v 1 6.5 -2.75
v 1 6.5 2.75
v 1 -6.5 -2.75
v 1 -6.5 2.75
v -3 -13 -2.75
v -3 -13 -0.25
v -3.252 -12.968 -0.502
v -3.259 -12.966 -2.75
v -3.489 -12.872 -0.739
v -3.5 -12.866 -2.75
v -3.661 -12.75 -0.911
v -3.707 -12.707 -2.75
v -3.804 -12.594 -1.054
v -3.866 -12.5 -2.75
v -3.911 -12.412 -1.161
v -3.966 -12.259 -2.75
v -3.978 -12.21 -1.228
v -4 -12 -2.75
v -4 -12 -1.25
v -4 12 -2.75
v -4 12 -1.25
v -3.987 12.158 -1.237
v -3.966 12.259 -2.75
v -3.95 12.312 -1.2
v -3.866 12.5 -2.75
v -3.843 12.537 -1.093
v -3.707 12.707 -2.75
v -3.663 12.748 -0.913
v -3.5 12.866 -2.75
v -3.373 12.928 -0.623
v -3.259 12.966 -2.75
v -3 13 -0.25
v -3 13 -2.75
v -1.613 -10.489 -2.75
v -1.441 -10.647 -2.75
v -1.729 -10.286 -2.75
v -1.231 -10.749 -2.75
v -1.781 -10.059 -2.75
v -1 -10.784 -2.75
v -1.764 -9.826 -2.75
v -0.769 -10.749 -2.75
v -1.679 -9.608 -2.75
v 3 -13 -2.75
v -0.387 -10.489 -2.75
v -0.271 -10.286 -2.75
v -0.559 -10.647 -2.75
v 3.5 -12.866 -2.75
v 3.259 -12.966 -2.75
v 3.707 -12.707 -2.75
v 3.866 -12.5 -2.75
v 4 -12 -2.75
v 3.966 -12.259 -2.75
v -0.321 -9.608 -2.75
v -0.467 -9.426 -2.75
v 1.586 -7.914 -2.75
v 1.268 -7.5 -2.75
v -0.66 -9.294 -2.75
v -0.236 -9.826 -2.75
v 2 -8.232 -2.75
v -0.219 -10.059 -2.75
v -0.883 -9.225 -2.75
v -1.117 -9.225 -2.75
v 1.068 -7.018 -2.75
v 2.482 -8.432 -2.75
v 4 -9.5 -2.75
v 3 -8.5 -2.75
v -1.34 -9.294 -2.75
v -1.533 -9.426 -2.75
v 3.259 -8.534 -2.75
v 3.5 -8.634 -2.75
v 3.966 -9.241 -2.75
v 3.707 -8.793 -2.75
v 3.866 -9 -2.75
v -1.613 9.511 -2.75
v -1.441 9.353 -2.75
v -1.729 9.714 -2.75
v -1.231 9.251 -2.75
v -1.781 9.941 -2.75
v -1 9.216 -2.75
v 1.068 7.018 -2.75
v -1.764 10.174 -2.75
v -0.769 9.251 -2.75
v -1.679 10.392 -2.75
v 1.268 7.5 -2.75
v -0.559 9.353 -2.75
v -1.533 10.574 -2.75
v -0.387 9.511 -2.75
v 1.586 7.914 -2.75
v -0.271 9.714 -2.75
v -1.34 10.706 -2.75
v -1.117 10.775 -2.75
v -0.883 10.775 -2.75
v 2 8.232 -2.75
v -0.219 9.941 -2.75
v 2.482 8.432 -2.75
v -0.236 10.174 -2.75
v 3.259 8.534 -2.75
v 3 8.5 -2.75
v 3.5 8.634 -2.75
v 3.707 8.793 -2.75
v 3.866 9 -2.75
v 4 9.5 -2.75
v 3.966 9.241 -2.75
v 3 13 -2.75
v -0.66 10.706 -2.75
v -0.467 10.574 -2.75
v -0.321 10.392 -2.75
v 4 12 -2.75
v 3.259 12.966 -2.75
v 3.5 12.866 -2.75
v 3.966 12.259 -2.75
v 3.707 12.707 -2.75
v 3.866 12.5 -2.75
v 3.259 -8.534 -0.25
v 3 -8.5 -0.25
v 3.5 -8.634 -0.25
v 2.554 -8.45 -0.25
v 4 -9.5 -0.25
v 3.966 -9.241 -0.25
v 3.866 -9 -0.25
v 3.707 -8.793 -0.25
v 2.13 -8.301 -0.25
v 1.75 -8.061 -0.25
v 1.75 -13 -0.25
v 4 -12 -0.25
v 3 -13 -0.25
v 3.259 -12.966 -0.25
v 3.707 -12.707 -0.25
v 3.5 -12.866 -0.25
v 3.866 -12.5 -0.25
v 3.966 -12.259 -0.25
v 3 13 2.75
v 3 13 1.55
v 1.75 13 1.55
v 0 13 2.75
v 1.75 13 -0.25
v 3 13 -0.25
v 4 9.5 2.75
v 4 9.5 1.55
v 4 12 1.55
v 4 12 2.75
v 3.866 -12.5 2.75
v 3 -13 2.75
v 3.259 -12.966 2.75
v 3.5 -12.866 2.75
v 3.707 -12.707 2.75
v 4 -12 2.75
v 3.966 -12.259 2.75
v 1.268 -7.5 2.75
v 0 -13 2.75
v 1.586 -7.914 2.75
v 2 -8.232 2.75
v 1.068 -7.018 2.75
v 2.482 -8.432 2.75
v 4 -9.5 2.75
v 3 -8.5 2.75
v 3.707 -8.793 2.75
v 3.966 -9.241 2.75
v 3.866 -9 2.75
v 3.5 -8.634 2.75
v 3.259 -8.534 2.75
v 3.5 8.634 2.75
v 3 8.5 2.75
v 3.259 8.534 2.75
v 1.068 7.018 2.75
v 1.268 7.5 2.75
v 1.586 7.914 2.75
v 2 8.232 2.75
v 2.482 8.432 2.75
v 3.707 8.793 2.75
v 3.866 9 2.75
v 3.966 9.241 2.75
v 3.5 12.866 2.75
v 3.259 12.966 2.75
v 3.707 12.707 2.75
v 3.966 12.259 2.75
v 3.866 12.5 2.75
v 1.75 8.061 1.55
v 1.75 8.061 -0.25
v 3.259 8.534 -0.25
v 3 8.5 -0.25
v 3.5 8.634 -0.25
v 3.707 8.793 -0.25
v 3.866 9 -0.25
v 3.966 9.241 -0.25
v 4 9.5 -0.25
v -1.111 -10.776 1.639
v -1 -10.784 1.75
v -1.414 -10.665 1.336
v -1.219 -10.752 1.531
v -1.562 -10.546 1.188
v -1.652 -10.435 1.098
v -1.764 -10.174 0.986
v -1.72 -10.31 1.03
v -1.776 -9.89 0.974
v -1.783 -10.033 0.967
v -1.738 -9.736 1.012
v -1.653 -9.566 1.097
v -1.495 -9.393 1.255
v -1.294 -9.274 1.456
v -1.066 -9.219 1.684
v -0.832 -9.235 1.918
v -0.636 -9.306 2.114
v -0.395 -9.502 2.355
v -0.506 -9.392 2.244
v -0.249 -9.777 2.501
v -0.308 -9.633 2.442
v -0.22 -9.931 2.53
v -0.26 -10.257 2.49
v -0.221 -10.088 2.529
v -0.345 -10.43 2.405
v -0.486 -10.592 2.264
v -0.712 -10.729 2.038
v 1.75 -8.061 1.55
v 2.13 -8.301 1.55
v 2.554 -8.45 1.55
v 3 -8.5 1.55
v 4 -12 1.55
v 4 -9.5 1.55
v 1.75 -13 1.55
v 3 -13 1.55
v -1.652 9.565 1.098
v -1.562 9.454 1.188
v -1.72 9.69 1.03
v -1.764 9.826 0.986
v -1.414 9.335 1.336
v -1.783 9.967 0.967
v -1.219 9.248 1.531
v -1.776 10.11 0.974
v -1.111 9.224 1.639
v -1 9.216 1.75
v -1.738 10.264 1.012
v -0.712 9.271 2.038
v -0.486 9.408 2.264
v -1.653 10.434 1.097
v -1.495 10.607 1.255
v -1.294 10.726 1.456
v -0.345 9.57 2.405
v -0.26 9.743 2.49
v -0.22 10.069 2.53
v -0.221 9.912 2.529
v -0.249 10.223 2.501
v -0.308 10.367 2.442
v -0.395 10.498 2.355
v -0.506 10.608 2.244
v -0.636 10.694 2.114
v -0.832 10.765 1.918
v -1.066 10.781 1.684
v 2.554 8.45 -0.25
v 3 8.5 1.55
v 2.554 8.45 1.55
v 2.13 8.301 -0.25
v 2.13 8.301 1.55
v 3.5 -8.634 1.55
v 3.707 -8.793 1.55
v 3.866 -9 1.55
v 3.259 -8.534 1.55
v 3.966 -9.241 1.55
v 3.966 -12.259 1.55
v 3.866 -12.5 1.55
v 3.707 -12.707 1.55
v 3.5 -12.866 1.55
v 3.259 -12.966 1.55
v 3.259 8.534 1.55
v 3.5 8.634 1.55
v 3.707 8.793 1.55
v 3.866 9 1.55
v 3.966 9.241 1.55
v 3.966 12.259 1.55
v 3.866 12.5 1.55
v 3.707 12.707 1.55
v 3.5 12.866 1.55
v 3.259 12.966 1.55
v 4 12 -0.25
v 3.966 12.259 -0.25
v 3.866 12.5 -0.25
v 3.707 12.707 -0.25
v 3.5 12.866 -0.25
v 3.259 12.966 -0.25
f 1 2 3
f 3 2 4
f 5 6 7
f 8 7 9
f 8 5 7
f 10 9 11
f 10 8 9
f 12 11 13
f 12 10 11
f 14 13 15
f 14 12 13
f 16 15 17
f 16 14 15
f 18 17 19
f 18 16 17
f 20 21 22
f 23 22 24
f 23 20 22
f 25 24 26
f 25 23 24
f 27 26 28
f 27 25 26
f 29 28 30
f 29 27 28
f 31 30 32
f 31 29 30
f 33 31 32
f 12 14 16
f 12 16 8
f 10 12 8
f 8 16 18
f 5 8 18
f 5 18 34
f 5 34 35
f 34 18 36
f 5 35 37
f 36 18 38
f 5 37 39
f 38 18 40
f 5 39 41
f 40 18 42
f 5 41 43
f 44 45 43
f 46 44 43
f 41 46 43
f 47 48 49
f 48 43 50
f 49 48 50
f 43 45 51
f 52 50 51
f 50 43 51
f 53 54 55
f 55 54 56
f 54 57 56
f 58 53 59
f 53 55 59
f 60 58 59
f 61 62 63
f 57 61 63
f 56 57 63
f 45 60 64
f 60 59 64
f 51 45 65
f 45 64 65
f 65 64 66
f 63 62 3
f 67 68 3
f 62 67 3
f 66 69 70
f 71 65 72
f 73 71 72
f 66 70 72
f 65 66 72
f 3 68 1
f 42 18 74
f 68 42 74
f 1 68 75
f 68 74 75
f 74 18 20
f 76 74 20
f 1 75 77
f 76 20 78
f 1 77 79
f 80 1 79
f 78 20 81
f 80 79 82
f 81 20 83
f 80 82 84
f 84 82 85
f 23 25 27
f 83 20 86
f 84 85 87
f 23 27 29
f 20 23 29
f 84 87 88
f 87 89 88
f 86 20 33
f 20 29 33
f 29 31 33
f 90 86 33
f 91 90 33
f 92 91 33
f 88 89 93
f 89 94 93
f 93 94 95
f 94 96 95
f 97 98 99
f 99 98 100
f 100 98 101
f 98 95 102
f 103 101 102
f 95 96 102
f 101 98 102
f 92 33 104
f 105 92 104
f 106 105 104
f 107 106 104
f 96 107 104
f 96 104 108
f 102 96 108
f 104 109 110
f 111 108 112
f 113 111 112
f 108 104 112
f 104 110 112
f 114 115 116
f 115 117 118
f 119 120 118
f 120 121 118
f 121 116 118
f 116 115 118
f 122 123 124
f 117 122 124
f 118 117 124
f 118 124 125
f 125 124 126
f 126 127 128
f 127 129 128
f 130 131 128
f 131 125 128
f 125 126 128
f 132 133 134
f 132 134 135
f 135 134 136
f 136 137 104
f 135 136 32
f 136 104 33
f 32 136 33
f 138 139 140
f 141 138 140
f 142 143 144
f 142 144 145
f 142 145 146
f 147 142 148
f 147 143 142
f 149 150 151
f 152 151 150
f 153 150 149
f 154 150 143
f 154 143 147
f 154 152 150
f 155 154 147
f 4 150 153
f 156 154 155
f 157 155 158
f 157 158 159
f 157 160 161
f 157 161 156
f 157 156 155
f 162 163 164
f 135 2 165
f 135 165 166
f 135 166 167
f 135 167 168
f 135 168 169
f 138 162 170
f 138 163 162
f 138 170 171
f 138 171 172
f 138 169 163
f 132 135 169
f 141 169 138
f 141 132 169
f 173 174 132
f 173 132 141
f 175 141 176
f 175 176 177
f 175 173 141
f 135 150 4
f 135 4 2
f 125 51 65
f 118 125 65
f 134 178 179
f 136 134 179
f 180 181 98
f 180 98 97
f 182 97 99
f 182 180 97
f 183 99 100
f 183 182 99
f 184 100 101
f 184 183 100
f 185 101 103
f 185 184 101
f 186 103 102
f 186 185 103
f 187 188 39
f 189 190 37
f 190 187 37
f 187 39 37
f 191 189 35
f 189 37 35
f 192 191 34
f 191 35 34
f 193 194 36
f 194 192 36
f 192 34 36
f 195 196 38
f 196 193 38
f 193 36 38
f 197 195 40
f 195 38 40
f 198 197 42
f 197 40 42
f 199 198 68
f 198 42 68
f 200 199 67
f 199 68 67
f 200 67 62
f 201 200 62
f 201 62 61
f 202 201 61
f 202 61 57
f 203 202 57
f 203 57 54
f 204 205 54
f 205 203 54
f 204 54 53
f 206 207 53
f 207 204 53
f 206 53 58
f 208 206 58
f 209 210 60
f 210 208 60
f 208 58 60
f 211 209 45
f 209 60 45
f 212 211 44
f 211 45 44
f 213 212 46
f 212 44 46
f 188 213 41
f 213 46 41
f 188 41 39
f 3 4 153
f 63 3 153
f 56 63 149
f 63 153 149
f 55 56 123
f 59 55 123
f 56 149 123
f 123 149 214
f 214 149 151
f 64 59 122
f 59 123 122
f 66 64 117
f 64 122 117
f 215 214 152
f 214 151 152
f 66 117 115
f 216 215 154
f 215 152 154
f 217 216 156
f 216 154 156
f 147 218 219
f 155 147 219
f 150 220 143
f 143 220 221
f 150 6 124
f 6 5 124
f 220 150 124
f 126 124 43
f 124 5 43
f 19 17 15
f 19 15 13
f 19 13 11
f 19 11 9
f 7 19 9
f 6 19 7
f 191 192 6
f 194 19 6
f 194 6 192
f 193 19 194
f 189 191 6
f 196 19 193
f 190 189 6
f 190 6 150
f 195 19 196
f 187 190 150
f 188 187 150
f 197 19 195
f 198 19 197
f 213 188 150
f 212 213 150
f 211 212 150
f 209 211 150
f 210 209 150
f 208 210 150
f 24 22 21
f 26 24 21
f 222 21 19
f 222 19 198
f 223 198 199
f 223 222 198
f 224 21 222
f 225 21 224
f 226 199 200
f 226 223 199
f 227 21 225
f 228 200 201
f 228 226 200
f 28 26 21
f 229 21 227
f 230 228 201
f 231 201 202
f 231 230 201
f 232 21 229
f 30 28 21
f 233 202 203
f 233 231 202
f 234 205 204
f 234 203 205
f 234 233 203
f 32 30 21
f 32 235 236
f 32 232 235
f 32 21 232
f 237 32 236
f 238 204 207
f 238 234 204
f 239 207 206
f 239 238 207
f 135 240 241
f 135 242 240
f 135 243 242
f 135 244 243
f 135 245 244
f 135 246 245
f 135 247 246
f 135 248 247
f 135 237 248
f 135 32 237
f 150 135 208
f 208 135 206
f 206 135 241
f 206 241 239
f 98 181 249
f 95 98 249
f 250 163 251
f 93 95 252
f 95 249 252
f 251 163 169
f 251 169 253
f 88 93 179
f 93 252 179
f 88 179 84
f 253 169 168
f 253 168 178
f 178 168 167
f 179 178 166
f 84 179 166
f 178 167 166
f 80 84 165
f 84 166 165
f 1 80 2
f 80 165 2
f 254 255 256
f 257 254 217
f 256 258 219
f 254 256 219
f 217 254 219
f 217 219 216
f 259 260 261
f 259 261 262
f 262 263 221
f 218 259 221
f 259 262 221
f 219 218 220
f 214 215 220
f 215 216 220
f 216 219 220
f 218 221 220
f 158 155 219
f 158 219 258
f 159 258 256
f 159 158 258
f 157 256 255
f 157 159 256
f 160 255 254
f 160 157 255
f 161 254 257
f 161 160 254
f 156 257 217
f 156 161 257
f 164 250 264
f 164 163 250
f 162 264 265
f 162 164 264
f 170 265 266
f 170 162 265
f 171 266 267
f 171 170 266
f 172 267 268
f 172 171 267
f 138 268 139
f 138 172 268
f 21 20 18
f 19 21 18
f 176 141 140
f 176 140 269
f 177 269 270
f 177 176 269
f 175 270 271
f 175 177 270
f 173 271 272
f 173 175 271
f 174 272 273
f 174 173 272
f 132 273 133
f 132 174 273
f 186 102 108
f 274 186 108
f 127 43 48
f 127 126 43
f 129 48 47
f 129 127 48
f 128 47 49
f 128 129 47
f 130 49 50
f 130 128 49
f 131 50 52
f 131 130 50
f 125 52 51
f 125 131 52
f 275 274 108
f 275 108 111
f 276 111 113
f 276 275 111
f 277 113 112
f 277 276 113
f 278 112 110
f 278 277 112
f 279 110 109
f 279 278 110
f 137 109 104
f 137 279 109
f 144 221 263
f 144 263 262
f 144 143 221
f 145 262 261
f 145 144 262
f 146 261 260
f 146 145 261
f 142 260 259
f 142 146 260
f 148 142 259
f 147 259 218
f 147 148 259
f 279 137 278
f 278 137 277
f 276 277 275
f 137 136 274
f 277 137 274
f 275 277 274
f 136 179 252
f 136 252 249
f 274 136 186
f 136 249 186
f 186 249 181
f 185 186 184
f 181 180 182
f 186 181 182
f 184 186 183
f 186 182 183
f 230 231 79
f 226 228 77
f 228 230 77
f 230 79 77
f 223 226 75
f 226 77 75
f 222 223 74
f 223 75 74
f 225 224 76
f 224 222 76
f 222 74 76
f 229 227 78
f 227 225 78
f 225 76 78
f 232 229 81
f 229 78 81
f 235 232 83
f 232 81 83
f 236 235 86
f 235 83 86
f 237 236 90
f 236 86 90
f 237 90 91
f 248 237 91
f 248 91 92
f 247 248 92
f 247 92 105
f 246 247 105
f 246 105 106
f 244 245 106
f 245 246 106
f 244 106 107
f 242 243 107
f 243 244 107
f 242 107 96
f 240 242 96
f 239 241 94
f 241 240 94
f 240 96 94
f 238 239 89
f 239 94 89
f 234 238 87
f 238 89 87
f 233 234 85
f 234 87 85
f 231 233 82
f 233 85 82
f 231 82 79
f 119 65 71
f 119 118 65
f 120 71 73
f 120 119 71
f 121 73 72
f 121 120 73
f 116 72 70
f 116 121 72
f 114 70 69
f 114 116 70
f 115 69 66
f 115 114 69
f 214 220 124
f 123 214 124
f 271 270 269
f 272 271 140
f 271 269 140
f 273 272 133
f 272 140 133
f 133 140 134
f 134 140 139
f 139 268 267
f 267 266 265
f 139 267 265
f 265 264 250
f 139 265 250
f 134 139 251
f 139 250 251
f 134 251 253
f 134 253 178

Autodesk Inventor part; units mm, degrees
ref_plane "YZ Plane" through (0, 0, 0) normal (1, 0, 0) x (0, 1, 0)
ref_plane "XZ Plane" through (0, 0, 0) normal (0, 1, 0) x (-1, 0, 0)
ref_plane "XY Plane" through (0, 0, 0) normal (0, 0, 1) x (1, 0, 0)
sketch "Sketch1" plane through (0, 0, 0) normal (0, 0, 1) x (1, 0, 0)
  line L0 (-4, 13) -> (-4, -13)
  line L1 (-4, -13) -> (4, -13)
  line L2 (4, -13) -> (4, 13)
  line L3 (4, 13) -> (-4, 13)
  line L4 (-1, -10) -> (-1, 10) construction
  circle A0 centre (-1, 10) radius 3 construction
  point P0 (0, 0)
  point P1 (0, 13)
  point P2 (-4, 0)
  point P3 (-1, 0)
  dimension "d0" = 26
  dimension "d2" = 20
  dimension "d5" = 5
extrude "Extrusion1" add sketch "Sketch1" along normal mid plane 5.5
sketch "Sketch2" plane through (0, 0, 2.75) normal (0, 0, 1) x (1, 0, 0)
  point P0 (0, 0)
  point P1 (-1, 10)
  point P2 (-1, -10)
hole "Hole1" at (-1, 10, 2.75) at (-1, -10, 2.75) direction (0, 0, -1) diameter 1.567 end through all thread size "M2x0.4" class "6H" standard "ANSI Metric M Profile"
sketch "Sketch3" plane through (-4, -13, 2.75) normal (0, -1, 0) x (1, 0, 0)
  line L0 (8, -5.5) -> (8, 0) projected
  line L1 (0, 0) -> (8, 0) projected
  line L2 (0, -5.5) -> (0, 0) projected
  line L3 (8, -5.5) -> (0, -5.5) projected
  line L4 (8, -5.5) -> (8, 0) projected
  line L5 (8, -1.2) -> (5.75, -1.2)
  line L6 (5.75, -1.2) -> (5.75, -3)
  line L7 (5.75, -3) -> (8, -3)
  line L8 (8, -3) -> (8, -1.2)
  point P0 (4, -2.75)
  dimension "d13" = 2.5
  dimension "d14" = 1.8
  dimension "d15" = 2.25
extrude "Extrusion2" cut sketch "Sketch3" against normal through all contours L7 L6 L5 L0
chamfer "Chamfer1" distance 4 angle 45 1 edges at (-4, 0, 2.75)
sketch "Sketch4" plane through (0, 0, 2.75) normal (0, 0, 1) x (1, 0, 0)
  line L0 (0, -13) -> (0, 13) projected
  line L1 (0, -13) -> (4, -13) projected
  line L2 (4, -13) -> (4, 13) projected
  line L3 (4, 13) -> (0, 13) projected
  line L4 (4, 13) -> (4, -13) projected
  line L5 (4, 8.5) -> (1, 8.5)
  line L6 (1, 8.5) -> (1, -8.5)
  line L7 (1, -8.5) -> (4, -8.5)
  line L8 (4, -8.5) -> (4, 8.5)
  line L9 (4, -13) -> (4, 13) projected
  point P0 (0, 0)
  point P1 (4, 0)
  dimension "d21" = 3
  dimension "d22" = 17
extrude "Extrusion3" cut sketch "Sketch4" against normal through all contours L7 L6 L5 L2
fillet "Fillet1" radius 2 2 edges at (1, 8.5, 0) (1, -8.5, 0)
fillet "Fillet1" radius 1 10 edges at (4, -8.5, 2.15) (4, -13, 2.15) (4, -13, -1.5) (4, -8.5, -1.5) (4, 13, 2.15) (4, 8.5, 2.15) (4, 8.5, -1.5) (4, 13, -1.5) (-4, 13, -2) (-4, -13, -2)
properties part number "Payload_CameraSupport" material "Aluminum"
